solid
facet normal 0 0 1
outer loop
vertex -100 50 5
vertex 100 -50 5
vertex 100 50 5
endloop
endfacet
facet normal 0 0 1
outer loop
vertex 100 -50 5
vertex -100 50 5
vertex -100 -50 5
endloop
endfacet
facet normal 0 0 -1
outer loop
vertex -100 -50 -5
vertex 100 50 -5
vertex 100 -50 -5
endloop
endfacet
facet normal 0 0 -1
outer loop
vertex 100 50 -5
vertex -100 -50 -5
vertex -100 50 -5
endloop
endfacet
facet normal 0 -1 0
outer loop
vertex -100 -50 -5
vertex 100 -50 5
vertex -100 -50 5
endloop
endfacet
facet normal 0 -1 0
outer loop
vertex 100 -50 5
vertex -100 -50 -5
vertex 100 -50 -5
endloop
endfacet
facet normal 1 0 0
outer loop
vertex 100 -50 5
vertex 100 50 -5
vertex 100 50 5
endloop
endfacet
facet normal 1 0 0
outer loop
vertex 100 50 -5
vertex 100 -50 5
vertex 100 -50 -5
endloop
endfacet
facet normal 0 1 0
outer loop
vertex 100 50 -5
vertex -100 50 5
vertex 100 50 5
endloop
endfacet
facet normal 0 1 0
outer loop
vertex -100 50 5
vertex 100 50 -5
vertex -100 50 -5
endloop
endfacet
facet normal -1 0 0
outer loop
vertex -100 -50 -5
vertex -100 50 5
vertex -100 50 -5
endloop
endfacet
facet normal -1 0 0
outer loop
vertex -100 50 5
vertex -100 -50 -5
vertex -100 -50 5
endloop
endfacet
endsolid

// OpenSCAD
// Aluminium tooling plate (single connected solid, visible geometry)

length = 200;     // X (mm)
width  = 100;     // Y (mm)
thickness = 10;   // Z (mm)

// Optional edge treatment (set to 0 for sharp corners)
corner_radius = 0;  // mm

$fn = 96;

module rounded_plate(L, W, T, R) {
    r = min(max(R, 0), L/2, W/2);

    if (r <= 0) {
        cube([L, W, T], center=true);
    } else {
        // Robust rounded-rectangle prism using hull of corner cylinders
        hull() {
            for (sx = [-1, 1], sy = [-1, 1])
                translate([sx*(L/2 - r), sy*(W/2 - r), 0])
                    cylinder(r=r, h=T, center=true);
        }
    }
}

// Neutral metallic-looking color (helps identify "aluminum" in renders)
color([0.78, 0.80, 0.82])
    rounded_plate(length, width, thickness, corner_radius);
